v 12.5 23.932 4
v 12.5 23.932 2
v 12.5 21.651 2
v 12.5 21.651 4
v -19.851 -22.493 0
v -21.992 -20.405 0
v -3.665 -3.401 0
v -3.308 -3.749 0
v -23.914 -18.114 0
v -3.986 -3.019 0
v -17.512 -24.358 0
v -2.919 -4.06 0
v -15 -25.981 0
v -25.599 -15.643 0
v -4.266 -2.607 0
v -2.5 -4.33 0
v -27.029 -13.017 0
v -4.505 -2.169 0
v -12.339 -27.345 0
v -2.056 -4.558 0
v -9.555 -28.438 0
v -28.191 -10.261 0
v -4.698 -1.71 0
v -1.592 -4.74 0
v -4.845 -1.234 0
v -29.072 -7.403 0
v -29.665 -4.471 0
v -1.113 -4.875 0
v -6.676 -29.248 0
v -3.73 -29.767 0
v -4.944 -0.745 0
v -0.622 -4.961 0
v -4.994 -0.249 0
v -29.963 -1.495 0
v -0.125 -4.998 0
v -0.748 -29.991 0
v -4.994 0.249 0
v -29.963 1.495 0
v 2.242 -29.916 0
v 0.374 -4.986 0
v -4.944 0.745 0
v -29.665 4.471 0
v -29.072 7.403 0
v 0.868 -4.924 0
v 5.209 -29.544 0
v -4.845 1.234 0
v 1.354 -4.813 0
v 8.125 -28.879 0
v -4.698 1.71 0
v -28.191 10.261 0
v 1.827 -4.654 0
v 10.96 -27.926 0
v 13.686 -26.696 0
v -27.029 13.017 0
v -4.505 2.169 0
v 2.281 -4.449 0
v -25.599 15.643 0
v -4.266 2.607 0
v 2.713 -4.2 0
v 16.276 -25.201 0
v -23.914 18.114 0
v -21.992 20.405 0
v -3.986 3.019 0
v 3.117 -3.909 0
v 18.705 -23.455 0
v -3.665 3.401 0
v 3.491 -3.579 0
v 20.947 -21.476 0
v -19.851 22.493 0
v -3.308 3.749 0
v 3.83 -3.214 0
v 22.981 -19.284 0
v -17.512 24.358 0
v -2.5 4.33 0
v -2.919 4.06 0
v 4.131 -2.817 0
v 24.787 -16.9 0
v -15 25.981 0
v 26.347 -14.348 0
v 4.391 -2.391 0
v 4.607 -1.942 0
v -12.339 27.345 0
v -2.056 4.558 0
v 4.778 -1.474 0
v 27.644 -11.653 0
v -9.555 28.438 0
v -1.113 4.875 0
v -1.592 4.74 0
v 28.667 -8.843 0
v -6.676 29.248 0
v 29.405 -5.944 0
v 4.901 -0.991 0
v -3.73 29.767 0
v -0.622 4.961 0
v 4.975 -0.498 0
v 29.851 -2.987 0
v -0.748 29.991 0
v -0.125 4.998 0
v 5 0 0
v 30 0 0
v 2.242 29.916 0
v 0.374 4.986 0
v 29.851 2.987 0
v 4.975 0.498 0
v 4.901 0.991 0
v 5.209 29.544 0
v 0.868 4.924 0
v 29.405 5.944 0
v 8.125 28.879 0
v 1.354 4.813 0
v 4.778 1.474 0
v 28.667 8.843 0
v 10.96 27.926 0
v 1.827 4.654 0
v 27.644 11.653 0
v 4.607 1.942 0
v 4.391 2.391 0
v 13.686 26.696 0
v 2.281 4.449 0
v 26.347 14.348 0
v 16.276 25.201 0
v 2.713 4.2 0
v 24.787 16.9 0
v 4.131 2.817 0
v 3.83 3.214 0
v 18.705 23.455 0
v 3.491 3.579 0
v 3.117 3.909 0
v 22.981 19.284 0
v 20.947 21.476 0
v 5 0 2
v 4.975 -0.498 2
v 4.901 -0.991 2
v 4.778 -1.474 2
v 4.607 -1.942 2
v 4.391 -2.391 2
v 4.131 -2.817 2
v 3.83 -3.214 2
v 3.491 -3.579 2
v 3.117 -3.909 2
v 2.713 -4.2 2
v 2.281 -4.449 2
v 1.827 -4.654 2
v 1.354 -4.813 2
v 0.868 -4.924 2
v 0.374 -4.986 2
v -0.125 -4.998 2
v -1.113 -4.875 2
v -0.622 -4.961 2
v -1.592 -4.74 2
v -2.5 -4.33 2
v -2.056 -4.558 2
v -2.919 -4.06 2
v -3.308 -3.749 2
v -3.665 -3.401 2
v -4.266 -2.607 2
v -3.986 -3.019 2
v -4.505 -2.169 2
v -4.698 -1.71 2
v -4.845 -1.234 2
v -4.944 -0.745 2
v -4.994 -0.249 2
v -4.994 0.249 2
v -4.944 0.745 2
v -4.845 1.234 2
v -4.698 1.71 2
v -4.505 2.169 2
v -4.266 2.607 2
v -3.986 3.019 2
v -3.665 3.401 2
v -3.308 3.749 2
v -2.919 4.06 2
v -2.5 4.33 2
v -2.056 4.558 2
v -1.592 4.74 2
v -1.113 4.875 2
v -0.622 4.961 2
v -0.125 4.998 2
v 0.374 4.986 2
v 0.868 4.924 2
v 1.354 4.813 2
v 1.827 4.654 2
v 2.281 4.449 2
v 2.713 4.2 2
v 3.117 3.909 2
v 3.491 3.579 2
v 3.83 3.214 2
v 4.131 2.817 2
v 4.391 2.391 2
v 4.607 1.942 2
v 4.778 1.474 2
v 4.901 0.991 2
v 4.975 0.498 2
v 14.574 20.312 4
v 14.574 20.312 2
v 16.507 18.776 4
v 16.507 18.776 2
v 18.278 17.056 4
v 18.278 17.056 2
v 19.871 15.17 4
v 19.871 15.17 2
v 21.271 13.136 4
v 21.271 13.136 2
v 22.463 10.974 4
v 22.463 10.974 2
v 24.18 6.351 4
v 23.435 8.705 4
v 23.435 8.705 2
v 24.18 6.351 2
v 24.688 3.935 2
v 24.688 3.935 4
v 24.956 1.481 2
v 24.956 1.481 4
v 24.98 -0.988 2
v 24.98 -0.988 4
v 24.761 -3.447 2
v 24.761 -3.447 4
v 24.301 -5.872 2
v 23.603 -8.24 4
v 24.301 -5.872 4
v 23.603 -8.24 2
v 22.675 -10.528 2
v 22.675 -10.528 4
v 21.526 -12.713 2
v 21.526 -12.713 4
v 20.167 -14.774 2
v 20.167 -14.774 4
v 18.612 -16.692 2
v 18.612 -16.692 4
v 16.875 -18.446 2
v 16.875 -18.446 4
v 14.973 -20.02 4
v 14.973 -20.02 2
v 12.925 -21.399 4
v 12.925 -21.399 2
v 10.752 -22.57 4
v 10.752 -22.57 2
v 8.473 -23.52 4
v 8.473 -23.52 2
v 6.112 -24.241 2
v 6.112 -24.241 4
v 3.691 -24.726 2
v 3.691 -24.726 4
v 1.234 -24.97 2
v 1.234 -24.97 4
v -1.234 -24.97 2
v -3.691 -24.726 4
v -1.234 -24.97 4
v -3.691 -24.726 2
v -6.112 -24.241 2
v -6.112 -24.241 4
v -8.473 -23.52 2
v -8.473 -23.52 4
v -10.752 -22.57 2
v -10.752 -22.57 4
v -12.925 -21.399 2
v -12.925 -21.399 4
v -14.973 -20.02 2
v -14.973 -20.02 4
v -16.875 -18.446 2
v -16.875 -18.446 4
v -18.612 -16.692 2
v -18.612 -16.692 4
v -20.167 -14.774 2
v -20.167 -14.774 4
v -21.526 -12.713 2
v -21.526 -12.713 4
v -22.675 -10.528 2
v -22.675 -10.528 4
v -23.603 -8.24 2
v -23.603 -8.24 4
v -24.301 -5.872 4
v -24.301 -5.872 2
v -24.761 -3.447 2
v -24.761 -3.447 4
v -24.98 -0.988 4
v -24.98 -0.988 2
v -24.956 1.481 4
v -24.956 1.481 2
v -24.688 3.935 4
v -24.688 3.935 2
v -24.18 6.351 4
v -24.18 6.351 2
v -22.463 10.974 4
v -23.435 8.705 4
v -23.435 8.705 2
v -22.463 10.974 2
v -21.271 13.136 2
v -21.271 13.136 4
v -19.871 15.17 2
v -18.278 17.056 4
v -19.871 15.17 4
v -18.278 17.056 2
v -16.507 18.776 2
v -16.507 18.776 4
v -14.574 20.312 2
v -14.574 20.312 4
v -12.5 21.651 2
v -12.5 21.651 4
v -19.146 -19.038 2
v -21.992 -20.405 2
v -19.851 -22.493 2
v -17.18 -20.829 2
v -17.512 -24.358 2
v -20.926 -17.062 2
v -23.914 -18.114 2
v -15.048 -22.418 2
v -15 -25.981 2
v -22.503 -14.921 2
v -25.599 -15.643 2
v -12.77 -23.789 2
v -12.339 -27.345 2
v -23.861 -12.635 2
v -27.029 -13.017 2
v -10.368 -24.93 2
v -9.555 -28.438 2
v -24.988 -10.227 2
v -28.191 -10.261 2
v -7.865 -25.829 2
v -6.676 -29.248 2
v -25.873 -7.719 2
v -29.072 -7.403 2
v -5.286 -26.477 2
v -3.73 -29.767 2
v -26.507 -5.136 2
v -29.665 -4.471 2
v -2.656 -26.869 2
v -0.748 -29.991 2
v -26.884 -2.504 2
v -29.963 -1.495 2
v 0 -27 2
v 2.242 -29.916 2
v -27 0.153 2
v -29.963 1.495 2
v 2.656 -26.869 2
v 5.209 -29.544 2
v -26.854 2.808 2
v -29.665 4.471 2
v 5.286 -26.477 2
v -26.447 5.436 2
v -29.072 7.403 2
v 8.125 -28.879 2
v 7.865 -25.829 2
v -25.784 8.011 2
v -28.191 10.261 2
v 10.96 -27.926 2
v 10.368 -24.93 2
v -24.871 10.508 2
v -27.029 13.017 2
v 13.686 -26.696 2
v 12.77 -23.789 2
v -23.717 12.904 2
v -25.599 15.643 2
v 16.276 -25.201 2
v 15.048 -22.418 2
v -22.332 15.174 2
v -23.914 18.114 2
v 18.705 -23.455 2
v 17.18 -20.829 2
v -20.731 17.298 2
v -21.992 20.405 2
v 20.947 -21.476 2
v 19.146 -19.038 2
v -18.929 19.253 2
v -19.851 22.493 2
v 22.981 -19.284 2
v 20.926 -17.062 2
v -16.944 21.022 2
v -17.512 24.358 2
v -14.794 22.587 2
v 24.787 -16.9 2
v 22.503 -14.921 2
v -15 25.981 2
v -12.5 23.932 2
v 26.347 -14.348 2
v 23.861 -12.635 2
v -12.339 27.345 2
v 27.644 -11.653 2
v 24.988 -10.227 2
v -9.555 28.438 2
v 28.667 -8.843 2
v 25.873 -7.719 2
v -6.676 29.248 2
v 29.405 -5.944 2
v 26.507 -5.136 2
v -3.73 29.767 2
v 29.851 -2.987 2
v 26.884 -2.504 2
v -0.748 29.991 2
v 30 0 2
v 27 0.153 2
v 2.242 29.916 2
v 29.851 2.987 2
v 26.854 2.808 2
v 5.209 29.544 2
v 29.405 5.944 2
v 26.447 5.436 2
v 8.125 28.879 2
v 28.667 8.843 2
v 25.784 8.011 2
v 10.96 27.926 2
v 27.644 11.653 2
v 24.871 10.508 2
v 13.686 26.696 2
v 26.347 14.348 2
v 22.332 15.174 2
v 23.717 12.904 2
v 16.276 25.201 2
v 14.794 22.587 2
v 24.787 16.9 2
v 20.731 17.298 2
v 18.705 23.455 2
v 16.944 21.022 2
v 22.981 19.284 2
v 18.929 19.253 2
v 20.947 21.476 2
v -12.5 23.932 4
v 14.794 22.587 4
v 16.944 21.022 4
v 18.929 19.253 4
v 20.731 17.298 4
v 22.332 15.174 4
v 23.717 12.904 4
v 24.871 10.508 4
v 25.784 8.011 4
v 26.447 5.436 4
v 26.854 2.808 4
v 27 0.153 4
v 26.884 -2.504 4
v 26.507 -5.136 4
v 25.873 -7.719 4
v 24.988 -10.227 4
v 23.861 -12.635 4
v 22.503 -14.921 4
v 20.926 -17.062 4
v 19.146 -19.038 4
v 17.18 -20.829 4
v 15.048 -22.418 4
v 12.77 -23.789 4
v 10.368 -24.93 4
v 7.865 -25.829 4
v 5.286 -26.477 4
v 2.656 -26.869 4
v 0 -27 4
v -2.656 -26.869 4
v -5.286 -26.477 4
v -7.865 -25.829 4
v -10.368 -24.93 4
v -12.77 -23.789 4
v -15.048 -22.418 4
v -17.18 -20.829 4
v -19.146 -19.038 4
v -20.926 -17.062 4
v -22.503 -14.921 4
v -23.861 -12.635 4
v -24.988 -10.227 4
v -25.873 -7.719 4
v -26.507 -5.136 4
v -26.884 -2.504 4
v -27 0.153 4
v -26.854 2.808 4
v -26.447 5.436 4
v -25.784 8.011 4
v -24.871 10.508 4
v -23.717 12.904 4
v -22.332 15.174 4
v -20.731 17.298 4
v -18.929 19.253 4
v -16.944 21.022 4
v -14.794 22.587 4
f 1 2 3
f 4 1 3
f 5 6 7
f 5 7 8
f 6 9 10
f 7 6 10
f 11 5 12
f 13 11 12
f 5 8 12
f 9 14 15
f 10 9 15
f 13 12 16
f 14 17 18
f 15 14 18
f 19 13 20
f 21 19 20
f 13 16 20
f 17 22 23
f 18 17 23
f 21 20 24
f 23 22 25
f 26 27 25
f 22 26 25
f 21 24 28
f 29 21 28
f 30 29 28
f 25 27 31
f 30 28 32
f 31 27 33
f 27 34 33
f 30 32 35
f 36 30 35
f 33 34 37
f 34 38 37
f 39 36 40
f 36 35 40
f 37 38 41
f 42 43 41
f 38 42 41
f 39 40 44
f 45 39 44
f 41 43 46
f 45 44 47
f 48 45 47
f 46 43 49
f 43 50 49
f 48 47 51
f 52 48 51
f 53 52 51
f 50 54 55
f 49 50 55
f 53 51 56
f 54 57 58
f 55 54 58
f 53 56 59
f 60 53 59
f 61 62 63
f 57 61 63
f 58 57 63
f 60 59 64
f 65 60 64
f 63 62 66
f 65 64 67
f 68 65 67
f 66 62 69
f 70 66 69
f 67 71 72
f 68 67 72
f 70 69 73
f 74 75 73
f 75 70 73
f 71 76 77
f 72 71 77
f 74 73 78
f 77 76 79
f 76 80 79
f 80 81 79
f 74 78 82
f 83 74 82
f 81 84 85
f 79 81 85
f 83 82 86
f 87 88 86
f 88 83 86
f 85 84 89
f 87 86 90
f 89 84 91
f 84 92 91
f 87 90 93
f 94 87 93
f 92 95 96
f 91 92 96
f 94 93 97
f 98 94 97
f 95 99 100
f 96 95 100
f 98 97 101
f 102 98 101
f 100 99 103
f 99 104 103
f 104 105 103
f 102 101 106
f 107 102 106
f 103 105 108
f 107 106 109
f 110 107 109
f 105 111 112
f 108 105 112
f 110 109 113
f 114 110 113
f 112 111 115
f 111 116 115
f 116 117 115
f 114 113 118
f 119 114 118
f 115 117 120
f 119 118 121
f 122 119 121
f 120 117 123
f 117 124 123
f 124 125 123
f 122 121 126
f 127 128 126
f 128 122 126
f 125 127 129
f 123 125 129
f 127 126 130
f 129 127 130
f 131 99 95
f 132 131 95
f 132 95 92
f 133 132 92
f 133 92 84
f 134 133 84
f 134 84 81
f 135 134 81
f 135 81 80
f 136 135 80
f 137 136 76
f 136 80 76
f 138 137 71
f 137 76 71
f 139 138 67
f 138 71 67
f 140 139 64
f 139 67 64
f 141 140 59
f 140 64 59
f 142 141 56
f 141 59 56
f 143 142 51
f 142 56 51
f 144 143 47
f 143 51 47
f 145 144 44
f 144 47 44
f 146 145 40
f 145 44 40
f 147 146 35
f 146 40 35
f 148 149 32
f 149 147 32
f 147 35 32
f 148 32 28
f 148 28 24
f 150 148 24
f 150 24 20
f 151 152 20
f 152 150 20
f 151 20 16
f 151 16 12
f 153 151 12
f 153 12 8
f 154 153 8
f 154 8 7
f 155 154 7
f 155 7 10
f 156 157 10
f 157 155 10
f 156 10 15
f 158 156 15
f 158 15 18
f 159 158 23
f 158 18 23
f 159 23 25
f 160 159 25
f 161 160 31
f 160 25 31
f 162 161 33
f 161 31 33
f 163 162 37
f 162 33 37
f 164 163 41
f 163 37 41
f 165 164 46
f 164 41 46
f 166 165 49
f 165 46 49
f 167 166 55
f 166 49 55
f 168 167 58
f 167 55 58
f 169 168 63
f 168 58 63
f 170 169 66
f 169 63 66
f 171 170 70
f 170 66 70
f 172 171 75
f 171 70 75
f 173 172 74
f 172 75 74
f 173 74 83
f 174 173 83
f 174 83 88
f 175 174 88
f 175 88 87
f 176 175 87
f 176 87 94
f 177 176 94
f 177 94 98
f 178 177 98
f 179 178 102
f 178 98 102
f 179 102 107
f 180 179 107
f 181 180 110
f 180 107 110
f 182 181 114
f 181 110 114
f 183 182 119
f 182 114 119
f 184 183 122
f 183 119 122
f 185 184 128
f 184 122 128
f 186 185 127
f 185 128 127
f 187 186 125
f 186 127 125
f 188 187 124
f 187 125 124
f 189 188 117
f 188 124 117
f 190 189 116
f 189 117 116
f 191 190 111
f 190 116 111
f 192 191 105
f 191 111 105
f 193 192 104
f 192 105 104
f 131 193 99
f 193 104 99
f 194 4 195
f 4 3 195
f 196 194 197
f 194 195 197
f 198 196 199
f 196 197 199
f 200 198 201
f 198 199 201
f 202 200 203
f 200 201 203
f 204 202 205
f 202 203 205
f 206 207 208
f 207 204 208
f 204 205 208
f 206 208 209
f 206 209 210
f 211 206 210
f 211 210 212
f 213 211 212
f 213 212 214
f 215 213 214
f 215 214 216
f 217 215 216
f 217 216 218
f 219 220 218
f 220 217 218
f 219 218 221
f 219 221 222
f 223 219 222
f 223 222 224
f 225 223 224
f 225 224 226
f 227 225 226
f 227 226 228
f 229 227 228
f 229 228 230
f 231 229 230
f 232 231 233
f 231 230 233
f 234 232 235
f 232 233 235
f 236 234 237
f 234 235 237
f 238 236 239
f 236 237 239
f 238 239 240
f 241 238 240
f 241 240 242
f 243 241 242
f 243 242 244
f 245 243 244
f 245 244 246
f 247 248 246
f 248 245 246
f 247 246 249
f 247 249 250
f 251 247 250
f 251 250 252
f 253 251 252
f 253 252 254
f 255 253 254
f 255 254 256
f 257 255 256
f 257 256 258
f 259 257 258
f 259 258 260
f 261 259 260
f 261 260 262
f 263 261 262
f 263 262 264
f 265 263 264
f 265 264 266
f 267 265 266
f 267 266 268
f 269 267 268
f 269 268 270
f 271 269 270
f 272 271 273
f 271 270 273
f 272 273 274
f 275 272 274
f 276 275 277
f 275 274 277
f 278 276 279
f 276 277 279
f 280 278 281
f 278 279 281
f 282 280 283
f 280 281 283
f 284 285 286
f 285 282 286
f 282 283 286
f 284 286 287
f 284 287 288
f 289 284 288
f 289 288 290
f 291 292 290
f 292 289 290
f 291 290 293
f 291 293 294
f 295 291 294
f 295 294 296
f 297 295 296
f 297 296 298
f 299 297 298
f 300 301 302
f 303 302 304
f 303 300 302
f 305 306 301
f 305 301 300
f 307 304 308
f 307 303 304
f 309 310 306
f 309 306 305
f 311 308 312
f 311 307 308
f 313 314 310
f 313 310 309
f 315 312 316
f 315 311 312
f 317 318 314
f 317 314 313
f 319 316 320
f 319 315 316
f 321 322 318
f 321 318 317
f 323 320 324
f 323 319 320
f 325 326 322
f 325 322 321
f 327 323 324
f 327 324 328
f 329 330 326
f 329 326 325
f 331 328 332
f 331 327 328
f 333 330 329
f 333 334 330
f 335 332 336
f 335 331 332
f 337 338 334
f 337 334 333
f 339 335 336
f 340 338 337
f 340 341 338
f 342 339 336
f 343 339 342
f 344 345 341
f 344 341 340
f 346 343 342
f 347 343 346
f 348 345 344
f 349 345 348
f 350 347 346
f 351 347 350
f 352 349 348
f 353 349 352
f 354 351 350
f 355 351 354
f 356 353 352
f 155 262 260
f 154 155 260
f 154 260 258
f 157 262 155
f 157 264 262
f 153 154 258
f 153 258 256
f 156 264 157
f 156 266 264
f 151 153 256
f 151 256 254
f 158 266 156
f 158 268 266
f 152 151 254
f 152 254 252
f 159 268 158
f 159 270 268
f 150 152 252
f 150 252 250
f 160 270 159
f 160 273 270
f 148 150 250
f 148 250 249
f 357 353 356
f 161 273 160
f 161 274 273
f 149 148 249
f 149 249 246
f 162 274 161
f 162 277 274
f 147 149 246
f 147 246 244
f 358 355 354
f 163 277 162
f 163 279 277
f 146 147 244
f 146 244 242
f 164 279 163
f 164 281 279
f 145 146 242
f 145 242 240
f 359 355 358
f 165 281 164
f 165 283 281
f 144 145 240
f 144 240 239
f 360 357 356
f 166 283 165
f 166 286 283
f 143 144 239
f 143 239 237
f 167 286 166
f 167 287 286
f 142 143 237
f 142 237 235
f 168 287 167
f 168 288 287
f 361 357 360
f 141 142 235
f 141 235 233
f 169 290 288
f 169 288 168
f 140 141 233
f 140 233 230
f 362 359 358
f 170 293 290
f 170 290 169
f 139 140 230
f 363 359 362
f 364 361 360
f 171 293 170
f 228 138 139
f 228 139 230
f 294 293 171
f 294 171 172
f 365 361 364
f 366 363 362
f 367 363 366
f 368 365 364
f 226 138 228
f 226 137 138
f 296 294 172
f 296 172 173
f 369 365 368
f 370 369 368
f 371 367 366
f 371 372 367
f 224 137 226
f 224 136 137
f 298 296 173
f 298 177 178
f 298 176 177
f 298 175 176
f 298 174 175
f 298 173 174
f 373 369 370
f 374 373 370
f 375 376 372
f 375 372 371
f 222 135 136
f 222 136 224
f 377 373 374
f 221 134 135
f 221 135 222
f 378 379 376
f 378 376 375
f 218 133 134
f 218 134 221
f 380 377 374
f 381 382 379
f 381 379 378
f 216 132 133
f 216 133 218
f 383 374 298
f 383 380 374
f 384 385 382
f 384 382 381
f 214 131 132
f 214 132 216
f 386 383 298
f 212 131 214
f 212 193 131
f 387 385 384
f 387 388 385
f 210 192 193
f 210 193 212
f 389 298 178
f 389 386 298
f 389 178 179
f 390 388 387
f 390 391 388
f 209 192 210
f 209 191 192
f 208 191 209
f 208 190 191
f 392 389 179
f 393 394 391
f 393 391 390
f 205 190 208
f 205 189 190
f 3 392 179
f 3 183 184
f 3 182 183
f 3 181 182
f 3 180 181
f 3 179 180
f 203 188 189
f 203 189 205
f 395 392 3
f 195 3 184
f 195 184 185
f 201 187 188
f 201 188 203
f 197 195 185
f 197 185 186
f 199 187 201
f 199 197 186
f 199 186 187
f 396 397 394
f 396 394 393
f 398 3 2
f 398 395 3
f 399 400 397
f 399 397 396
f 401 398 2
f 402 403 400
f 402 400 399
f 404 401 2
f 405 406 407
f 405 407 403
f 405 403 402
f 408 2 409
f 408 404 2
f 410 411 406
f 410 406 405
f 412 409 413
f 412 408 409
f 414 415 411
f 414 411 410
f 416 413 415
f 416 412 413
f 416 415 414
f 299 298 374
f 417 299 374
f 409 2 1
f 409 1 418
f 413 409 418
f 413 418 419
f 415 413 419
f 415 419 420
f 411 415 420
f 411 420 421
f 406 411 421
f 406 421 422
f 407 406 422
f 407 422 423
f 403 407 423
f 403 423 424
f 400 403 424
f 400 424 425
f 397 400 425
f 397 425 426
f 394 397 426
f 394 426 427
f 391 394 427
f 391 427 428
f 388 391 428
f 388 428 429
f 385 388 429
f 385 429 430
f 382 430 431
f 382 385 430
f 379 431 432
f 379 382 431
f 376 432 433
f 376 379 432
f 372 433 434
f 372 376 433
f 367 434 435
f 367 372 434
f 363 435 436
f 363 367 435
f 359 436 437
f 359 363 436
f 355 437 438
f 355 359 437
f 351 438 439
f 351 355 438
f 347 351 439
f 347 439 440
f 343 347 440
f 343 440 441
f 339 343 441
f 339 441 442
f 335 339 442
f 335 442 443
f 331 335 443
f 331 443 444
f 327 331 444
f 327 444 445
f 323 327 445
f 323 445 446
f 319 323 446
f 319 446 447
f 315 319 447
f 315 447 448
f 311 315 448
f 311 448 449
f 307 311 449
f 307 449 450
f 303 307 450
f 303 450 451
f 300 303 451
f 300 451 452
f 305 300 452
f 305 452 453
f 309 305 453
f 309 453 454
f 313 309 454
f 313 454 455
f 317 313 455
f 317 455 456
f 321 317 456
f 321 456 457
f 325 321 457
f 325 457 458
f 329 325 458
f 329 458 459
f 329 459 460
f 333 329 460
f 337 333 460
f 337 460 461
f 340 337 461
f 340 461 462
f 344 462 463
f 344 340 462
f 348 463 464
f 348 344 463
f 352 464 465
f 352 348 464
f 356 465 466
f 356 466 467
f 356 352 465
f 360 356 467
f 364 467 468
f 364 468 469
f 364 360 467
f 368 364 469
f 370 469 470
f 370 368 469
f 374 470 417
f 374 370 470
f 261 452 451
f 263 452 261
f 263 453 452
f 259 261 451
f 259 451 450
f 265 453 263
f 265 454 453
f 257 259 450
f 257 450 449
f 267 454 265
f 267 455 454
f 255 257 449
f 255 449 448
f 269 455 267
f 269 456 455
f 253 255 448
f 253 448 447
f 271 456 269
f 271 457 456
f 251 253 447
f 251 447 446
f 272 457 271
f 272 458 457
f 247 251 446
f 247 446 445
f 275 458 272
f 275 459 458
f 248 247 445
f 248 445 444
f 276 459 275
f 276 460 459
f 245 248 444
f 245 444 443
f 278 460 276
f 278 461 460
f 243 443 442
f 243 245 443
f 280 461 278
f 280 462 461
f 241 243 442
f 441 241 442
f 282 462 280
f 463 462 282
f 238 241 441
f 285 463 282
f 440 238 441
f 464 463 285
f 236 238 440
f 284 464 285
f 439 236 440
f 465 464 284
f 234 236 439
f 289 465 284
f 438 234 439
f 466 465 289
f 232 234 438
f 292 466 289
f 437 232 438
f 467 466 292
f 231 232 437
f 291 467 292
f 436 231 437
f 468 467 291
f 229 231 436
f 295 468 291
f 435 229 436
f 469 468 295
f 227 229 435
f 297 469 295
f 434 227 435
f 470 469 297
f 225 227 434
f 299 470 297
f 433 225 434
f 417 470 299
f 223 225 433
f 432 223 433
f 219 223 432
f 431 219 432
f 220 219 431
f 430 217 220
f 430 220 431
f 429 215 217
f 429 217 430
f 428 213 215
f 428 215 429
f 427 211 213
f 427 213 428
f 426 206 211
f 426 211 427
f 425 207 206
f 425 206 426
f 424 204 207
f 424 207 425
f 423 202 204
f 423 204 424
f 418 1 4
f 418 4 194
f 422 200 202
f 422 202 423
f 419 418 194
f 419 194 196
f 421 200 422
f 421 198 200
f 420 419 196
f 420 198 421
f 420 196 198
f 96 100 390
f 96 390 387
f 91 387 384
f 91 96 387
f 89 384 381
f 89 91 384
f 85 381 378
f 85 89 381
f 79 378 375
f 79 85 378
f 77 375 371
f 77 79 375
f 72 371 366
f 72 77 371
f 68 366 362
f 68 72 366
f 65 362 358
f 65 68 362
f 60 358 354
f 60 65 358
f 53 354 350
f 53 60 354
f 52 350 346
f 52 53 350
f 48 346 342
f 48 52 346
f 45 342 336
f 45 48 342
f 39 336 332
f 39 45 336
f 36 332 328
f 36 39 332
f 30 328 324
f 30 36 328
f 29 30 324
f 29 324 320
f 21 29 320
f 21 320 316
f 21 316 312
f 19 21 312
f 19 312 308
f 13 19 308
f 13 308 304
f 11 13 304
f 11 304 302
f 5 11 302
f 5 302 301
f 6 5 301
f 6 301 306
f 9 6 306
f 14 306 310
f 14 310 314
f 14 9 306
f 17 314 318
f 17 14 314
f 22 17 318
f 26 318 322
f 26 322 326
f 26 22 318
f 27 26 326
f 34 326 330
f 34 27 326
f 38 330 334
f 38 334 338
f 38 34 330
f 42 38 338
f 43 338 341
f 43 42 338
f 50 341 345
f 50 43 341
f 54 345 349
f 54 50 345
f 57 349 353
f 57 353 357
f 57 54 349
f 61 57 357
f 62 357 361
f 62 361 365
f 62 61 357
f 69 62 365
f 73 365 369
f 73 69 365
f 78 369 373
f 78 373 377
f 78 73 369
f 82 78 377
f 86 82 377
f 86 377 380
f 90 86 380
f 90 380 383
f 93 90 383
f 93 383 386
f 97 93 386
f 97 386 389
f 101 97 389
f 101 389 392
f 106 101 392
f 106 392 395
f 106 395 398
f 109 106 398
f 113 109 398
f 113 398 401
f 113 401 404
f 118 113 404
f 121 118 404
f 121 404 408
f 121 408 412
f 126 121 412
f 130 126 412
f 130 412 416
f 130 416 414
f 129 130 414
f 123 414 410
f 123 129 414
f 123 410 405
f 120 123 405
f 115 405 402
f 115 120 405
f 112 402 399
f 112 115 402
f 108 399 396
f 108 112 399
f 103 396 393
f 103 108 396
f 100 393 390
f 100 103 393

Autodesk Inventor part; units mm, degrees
ref_plane "YZ Plane" through (0, 0, 0) normal (1, 0, 0) x (0, 1, 0)
ref_plane "XZ Plane" through (0, 0, 0) normal (0, 1, 0) x (-1, 0, 0)
sketch "Sketch1" plane through (0, 0, 0) normal (0, 0, 1) x (1, 0, 0)
  circle A0 centre (0, 0) radius 30
  circle A1 centre (0, 0) radius 27
  circle A2 centre (0, 0) radius 5
  circle A3 centre (0, 0) radius 25
  dimension "d0" = 60
  dimension "d1" = 3
  dimension "d2" = 10
  dimension "d3" = 2
extrude "Extrusion1" add sketch "Sketch1" along normal blind 2 contours A0 | A1 | A3
extrude "Extrusion2" add sketch "Sketch1" along normal blind 4 contours A1
ref_plane "Work Plane1" through (0, 0, 2) normal (0, 0, 1) x (1, 0, 0)
sketch "Sketch2" plane through (0, 0, 2) normal (0, 0, 1) x (1, 0, 0)
  line L0 (-12.5, 32.3357) -> (12.5, 32.3357)
  line L1 (12.5, 32.3357) -> (12.5, 9.4484)
  line L2 (12.5, 9.4484) -> (-12.5, 9.4484)
  line L3 (-12.5, 9.4484) -> (-12.5, 32.3357)
  point P0 (0, 0)
  point P1 (0, 9.4484)
  dimension "d9" = 25
extrude "Extrusion3" cut sketch "Sketch2" along normal blind 4
properties part number "ServoHorn"
